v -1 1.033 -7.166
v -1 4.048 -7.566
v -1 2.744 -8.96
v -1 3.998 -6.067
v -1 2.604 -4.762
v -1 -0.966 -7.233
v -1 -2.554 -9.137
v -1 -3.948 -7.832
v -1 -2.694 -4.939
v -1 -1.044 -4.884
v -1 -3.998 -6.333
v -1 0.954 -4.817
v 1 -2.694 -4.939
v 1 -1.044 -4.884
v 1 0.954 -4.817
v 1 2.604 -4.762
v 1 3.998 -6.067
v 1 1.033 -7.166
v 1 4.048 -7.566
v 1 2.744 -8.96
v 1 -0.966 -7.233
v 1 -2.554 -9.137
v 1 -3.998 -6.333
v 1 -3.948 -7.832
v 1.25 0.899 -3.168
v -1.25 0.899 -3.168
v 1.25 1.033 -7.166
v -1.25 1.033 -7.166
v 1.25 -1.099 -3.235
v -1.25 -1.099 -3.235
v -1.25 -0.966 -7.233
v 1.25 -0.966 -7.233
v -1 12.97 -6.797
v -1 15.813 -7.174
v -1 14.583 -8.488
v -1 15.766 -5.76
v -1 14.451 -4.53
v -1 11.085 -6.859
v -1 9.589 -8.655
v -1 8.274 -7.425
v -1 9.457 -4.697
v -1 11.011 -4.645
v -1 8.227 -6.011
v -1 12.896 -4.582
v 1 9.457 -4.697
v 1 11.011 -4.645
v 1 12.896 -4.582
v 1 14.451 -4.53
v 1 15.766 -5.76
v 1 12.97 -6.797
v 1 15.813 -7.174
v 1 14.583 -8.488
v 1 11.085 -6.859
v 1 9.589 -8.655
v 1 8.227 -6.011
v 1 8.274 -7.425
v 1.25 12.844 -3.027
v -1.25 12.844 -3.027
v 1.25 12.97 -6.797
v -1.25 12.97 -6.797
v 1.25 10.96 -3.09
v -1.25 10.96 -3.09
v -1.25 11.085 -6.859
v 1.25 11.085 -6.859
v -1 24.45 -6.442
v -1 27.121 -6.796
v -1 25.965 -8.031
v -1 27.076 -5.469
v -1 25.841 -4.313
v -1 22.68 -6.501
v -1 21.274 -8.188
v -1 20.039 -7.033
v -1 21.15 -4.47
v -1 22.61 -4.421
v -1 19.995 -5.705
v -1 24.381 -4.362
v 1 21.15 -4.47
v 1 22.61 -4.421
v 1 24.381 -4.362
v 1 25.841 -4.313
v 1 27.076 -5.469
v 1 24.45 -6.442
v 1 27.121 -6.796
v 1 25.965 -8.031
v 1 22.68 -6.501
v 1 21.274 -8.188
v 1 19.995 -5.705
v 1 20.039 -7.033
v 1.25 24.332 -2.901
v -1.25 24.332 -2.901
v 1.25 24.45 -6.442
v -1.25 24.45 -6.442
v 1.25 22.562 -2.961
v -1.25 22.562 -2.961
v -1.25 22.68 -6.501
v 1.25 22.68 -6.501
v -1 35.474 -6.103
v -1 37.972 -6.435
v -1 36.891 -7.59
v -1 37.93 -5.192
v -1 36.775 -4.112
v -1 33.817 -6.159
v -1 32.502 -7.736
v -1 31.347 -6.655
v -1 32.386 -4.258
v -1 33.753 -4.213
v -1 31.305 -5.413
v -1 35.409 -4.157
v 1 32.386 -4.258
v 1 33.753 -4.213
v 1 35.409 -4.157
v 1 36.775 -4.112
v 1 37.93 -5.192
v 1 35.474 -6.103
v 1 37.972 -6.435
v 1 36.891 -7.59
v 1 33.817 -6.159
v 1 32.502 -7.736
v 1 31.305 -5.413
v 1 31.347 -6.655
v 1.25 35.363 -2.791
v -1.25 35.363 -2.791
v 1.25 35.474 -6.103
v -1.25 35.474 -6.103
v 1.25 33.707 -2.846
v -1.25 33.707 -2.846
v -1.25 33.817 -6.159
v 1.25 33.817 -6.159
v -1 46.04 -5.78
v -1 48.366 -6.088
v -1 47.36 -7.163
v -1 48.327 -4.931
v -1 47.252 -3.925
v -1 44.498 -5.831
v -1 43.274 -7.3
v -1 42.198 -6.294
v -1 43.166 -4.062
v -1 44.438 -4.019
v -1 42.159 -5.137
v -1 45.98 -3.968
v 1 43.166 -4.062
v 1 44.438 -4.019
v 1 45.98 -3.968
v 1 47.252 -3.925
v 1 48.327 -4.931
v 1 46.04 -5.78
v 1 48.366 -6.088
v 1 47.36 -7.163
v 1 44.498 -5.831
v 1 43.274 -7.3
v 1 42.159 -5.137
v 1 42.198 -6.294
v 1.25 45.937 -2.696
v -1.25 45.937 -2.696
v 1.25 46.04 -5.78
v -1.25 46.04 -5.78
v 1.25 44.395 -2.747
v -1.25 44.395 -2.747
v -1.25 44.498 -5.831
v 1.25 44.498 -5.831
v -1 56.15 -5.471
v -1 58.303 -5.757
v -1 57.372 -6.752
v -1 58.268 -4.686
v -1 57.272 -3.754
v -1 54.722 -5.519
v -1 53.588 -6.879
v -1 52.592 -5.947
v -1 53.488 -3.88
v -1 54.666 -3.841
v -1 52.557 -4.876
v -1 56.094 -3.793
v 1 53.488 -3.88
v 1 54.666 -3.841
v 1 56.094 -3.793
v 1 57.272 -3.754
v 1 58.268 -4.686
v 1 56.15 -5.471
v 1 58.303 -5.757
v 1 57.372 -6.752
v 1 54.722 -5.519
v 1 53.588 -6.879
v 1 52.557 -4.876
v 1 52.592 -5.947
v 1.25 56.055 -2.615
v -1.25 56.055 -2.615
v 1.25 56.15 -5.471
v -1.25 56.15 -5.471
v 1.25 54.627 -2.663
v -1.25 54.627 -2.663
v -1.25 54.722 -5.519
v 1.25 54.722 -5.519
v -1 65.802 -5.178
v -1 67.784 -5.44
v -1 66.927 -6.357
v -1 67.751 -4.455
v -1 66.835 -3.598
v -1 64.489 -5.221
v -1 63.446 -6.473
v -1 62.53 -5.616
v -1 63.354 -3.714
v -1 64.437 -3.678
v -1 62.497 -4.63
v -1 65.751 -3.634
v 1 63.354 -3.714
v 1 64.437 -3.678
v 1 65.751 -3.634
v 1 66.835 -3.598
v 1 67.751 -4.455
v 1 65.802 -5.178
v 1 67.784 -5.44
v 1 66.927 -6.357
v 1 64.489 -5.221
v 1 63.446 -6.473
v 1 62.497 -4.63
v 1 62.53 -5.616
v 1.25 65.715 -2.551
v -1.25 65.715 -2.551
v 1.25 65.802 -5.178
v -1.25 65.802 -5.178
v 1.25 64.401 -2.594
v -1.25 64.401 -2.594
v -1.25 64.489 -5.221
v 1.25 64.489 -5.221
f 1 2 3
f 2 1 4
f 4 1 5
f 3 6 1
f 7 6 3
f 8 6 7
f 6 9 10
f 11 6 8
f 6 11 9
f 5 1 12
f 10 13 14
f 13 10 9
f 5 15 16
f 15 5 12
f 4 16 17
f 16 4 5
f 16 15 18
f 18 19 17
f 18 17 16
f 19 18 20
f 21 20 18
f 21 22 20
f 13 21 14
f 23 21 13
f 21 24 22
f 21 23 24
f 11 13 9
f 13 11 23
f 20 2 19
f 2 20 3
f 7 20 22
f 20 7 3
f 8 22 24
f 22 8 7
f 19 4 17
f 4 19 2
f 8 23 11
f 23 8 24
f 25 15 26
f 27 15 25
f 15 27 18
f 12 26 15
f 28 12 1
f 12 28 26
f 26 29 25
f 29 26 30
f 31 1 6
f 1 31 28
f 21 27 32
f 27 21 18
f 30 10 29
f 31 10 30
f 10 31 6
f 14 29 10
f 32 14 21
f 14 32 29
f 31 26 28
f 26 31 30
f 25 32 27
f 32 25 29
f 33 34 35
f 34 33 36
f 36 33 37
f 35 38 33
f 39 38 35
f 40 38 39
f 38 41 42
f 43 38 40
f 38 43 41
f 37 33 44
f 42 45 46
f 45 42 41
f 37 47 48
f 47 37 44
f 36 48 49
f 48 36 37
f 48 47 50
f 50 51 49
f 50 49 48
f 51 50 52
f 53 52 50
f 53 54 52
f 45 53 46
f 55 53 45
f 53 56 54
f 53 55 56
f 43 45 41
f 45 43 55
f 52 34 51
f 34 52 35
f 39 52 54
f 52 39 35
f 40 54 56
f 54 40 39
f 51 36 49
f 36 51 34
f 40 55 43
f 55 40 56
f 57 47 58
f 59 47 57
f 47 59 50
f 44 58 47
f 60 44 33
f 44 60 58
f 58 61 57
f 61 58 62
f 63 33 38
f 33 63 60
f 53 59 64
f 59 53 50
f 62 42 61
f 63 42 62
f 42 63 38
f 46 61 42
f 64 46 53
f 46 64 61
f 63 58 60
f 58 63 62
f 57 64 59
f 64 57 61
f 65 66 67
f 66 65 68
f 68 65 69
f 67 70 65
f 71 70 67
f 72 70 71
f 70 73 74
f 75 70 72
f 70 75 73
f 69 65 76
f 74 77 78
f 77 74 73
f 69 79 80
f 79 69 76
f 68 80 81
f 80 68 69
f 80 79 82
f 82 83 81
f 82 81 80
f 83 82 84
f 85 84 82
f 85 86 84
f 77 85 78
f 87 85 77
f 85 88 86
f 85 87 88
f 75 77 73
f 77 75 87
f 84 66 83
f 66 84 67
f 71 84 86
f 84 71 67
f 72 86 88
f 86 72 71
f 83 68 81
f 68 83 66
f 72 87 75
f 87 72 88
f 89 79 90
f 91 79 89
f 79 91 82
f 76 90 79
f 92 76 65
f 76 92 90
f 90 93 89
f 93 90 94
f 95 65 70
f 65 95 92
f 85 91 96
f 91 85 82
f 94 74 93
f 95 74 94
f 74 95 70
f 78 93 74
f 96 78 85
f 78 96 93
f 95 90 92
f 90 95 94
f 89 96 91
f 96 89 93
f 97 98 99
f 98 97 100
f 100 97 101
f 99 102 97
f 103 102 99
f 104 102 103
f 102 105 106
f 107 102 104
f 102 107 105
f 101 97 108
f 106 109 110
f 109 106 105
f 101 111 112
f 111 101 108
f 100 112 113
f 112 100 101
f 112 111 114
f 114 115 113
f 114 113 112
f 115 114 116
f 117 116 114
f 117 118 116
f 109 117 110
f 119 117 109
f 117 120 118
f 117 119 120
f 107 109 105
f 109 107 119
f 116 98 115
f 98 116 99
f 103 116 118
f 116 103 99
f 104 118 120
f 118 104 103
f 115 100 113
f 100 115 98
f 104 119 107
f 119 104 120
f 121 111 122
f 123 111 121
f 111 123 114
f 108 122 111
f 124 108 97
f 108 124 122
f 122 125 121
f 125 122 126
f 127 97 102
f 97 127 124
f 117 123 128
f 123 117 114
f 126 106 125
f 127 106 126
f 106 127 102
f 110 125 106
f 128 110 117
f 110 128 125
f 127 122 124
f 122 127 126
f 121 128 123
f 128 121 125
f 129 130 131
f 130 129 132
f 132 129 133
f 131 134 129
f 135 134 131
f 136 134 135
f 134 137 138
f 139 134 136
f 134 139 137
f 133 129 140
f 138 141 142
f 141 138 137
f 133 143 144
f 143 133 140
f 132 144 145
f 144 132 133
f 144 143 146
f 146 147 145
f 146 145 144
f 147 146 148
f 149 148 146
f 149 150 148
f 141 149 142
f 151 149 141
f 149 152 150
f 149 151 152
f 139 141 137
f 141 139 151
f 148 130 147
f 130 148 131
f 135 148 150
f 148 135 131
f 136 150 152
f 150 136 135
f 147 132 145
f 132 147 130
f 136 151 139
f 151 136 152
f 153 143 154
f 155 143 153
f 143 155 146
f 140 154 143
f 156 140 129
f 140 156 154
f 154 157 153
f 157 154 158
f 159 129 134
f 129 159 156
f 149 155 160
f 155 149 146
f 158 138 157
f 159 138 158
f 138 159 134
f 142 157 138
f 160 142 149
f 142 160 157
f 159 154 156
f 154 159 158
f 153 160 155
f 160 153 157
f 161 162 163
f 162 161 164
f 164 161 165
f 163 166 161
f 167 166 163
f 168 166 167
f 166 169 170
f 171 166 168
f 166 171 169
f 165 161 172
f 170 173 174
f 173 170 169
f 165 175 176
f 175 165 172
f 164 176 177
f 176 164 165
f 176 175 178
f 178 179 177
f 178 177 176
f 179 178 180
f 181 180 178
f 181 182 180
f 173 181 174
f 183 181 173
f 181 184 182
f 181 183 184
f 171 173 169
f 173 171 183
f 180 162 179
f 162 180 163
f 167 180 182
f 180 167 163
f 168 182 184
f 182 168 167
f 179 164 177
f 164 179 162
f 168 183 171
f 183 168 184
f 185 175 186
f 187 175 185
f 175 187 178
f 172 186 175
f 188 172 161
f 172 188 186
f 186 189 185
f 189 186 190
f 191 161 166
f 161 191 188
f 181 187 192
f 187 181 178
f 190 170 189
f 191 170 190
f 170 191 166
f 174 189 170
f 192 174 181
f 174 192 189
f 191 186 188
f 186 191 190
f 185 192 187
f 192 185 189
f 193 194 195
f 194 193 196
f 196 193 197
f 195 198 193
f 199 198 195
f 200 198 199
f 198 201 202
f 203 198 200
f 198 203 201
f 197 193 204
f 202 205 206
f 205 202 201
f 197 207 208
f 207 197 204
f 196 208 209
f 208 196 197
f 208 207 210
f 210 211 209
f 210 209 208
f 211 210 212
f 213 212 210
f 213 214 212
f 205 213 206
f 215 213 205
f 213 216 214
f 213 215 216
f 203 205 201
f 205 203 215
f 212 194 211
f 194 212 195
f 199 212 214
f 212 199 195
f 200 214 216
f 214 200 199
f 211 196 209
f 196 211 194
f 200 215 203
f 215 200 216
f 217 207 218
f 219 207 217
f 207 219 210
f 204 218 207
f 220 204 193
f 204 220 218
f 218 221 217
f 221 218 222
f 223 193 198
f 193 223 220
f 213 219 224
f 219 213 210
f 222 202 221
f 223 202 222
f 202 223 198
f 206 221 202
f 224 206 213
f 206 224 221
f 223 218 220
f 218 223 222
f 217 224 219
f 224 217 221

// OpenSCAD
// file: trapazoid test.scad
module a(){
polyhedron(
points=[ 
//lower layer
[-10,10,0], //0 -X +Y
[10,10,0], //1 +X +Y
[10,-10,0], //2 +X -Y
[-10,-10,0], //3 -X -Y 


// uper layer
[-5,5,5], //4 -X +Y
[5,5,5], //5 +X +Y
[5,-5,5], //6 +X -Y
[-5,-5,5] //7 -X -Y 
],
 
faces=[ 
 [0,3,2,1],  // bottom  K
  [5,4,0,1],  // front K
  [4,5,6,7],  // top
  [1,2, 6,5],  // right K
  [7,6,2,3],  // back K
  [4,7,3,0]] // left K
  );
  }
  module a_vertex(){
  translate([-10,10,0])color("white")cube([.5,.5,.5],true); //0
  translate([10,10,0])color("blue")cube([.5,.5,.5],true); //1
  translate([10,-10,0])color("green")cube([.5,.5,.5],true); //2
  translate([-10,-10,0])color("black")cube([.5,.5,.5],true); //3
  translate([-5,5,5])color("red")cube([.5,.5,.5],true); //4
  translate([5,5,5])color("teal")cube([.5,.5,.5],true); //5
  translate([5,-5,5])color("maroon")cube([.5,.5,.5],true); //6
  translate([-5,-5,5])color("grey")cube([.5,.5,.5],true); 
  }
  module b(){
  polyhedron(
points=[ 
//lower layer
[-10,7,0], //0 -X +Y
[-7,10,0], //1
[7,10,0], // 2 +X +Y
[10,7,0], // 3 
[10,-7,0], //4 +X -Y
  [7,-10,0],//5
[-7,-10,0], //6 -X -Y
 [-10,-7,0], //7


// uper layer
[-7,7,5], //8 -X +Y  was 4
[7,7,5], //9 +X +Y   was 5
[7,-7,5], //10 +X -Y
[-7,-7,5] //11 -X -Y 
],
 
faces=[ 
 [0,7,6,5,4,3,2,1],  //K
 [0,1,8], //K
 [2,3,9], //K
 [4,5,10], //K
 [6,7,11], //K
  [1,2,9,8],  //K
  [8,9,10,11],  // K
  [10,9,3,4],  // K
  [11,10,5,6],  // K
  [0,8,11,7] //K
  ] // left
  );
  }
 // b();
 module c_vertex(){
  translate([-10,7,0])color("white")cube([.5,.5,.5],true); //0
  translate([-7,10,0])color("blue")cube([.5,.5,.5],true); //1
  translate([7,10,0])color("green")cube([.5,.5,.5],true); //2
  translate([10,7,0])color("black")cube([.5,.5,.5],true); //3
  translate([10,-7,0])color("red")cube([.5,.5,.5],true); //4
  translate([7,-10,0])color("teal")cube([.5,.5,.5],true); //5
  translate([-7,-10,0])color("maroon")cube([.5,.5,.5],true); //6
  translate([-10,-7,0])color("grey")cube([.5,.5,.5],true); //7
  
    translate([-7,7,5])color("pink")cube([.5,.5,.5],true);
  translate([7,7,5])color("purple")cube([.5,.5,.5],true);
  translate([7,-7,5])color("cyan")cube([.5,.5,.5],true); //10
  translate([-7,-7,5])color("orange")cube([.5,.5,.5],true); //11
 }
  
  module trapazoidal_prism(X1, Y1, X2, Y2, Z){
      polyhedron(
points=[ 
//lower layer
[-.5*X1,.5*Y1,0], //0 -X +Y
[.5*X1,.5*Y1,0], //1 +X +Y
[.5*X1,-.5*Y1,0], //2 +X -Y
[-.5*X1,-.5*Y1,0], //3 -X -Y 


// uper layer
[-.5*X2,.5*Y2,Z], //4 -X +Y
[.5*X2,.5*Y2,Z], //5 +X +Y
[.5*X2,-.5*Y2,Z], //6 +X -Y
[-.5*X2,-.5*Y2,Z] //7 -X -Y 
],
 
faces=[ 
 [0,3,2,1],  // bottom  K
  [5,4,0,1],  // front K
  [4,5,6,7],  // top
  [1,2, 6,5],  // right K
  [7,6,2,3],  // back K
  [4,7,3,0]] // left
  );
  
  }
  
   module trapazoidal_prism_B(X1, Y1, X2, Y2, Z){
      //lower layer
        polyhedron(
points=[ 
[-.5*X1,.5*Y1-((Y1-Y2)/2),0], //0 -X +Y
[-1*(.5*X1-((X1-X2)/2)),.5*Y1,0], //1
[.5*X1-((X1-X2)/2),.5*Y1,0], // 2 +X +Y
[.5*X1,.5*Y1-((Y1-Y2)/2),0], // 3 
[.5*X1,-1*(.5*Y1-((Y1-Y2)/2)),0], //4 +X -Y
  [.5*X1-((X1-X2)/2),-.5*Y1,0],//5
[-1*(.5*X1-((X1-X2)/2)),-.5*Y1,0], //6 -X -Y
 [-.5*X1,-1*(.5*Y1-((Y1-Y2)/2)),0], //7


// uper layer
       

[-.5*X2,.5*Y2,Z], //8 -X +Y  was 4
[.5*X2,.5*Y2,Z], //9 +X +Y   was 5
[.5*X2,-.5*Y2,Z], //10 +X -Y
[-.5*X2,-.5*Y2,Z] //11 -X -Y 
],
 
faces=[ 
 [0,7,6,5,4,3,2,1],  //K
 [0,1,8], //K
 [2,3,9], //K
 [4,5,10], //K
 [6,7,11], //K
  [1,2,9,8],  //K
  [8,9,10,11],  // K
  [10,9,3,4],  // K
  [11,10,5,6],  // K
  [0,8,11,7] //K
  ]  // left
  );
  }
  
     module octogon_extrude(X1, Y1, X2, Y2, Z){
      //lower layer
linear_extrude(Z)
        polygon(
points=[ 
[-.5*X1,.5*Y1-((Y1-Y2)/2)], //0 -X +Y
[-1*(.5*X1-((X1-X2)/2)),.5*Y1], //1
[.5*X1-((X1-X2)/2),.5*Y1], // 2 +X +Y
[.5*X1,.5*Y1-((Y1-Y2)/2)], // 3 
[.5*X1,-1*(.5*Y1-((Y1-Y2)/2))], //4 +X -Y
  [.5*X1-((X1-X2)/2),-.5*Y1],//5
[-1*(.5*X1-((X1-X2)/2)),-.5*Y1], //6 -X -Y
 [-.5*X1,-1*(.5*Y1-((Y1-Y2)/2))], //7
]
 
      );
  }
  module offset_trapazoidal_prism(X1, Y1, X2, Y2, X3, Y3, Z){
      polyhedron(
points=[ 
//lower layer
[-.5*X1,.5*Y1,0], //0 -X +Y
[.5*X1,.5*Y1,0], //1 +X +Y
[.5*X1,-.5*Y1,0], //2 +X -Y
[-.5*X1,-.5*Y1,0], //3 -X -Y 

// uper layer
[-.5*X2+X3,.5*Y2+Y3,Z], //4 -X +Y
[.5*X2+X3,.5*Y2+Y3,Z], //5 +X +Y
[.5*X2+X3,-.5*Y2+Y3,Z], //6 +X -Y
[-.5*X2+X3,-.5*Y2+Y3,Z] //7 -X -Y 
],
 
faces=[ 
 [0,3,2,1],  // bottom  K
  [5,4,0,1],  // front K
  [4,5,6,7],  // top
  [1,2, 6,5],  // right K
  [7,6,2,3],  // back K
  [4,7,3,0]] // left
  );
  
  }
  
module simplified_offset_trapazoidal_prism(D1, D2, X1, Y1, Z){
      polyhedron(
points=[ 
//lower layer
[-.5*D1,.5*D1,0], //0 -X +Y
[.5*D1,.5*D1,0], //1 +X +Y
[.5*D1,-.5*D1,0], //2 +X -Y
[-.5*D1,-.5*D1,0], //3 -X -Y 

// uper layer
[-.5*D2+X1,.5*D2+Y1,Z], //4 -X +Y
[.5*D2+X1,.5*D2+Y1,Z], //5 +X +Y
[.5*D2+X1,-.5*D2+Y1,Z], //6 +X -Y
[-.5*D2+X1,-.5*D2+Y1,Z] //7 -X -Y 
],
 
faces=[ 
 [0,3,2,1],  // bottom  K
  [5,4,0,1],  // front K
  [4,5,6,7],  // top
  [1,2, 6,5],  // right K
  [7,6,2,3],  // back K
  [4,7,3,0]] // left
  );
  
  }

  module trig_test(Ang, Op, Base){
      polygon([ [-1*(.5*Base-(Op/tan(Ang))),Op],
      [.5*Base-Op/tan(Ang),Op], 
      [.5*Base,0],
      [-.5*Base,0]]);
  }
    module trig_test_2(Ang, Ang2, Op, Base){
      polygon([ [-1*(.5*Base-(Op/tan(Ang))),Op],
      [.5*Base-Op/tan(Ang2),Op], 
      [.5*Base,0],
      [-.5*Base,0]]);
  }

  
  
  module angle_prism(D, Z, Ang1, Ang2){
            polyhedron(
points=[ 
//lower layer
[-.5*D,.5*D,0], //0 -X +Y
[.5*D,.5*D,0], //1 +X +Y
[.5*D,-.5*D,0], //2 +X -Y
[-.5*D,-.5*D,0], //3 -X -Y 

// uper layer
[-1*(.5*D-(Z/tan(Ang1))),.5*D,Z], //4 -X +Y
[.5*D-(Z/tan(Ang2)),.5*D,Z], //5 +X +Y
[.5*D-(Z/tan(Ang2)),-.5*D,Z], //6 +X -Y
[-1*(.5*D-(Z/tan(Ang1))),-.5*D,Z] //7 -X -Y 
],
 
faces=[ 
 [0,1,2,3],  // bottom  K
  [0,4,5,1],  // front K
  [4,7,6,5],  // top
  [1,5, 6,2],  // right K
  [7,3,2,6],  // back K
  [4,0,3,7]] 
  );
  
  }
  
  module angle_prism_W(X, Y, Z, Ang1, Ang2){
            polyhedron(
points=[ 
//lower layer
[-.5*X,.5*Y,0], //0 -X +Y
[.5*X,.5*Y,0], //1 +X +Y
[.5*X,-.5*Y,0], //2 +X -Y
[-.5*X,-.5*Y,0], //3 -X -Y 

// uper layer
[-1*(.5*X  -(Z/tan(Ang1))),.5*Y,Z], //4 -X +Y
[.5*X-(Z/tan(Ang2)),.5*Y,Z], //5 +X +Y
[.5*X-(Z/tan(Ang2)),-.5*Y,Z], //6 +X -Y
[-1*(.5*X-(Z/tan(Ang1))),-.5*Y,Z] //7 -X -Y 
],
 
faces=[ 
 [0,1,2,3],  // bottom  K
  [0,4,5,1],  // front K
  [4,7,6,5],  // top
  [1,5, 6,2],  // right K
  [7,3,2,6],  // back K
  [4,0,3,7]] 
  );
  
  }
  
  
  module 4_angle_prism_W(X, Y, Z, Ang1, Ang2, Ang3, Ang4){
      //(Width, depth, heith, angle -x side, angle +x side, angle +y side, angle - y side
            polyhedron(
points=[ 
//lower layer
[-.5*X,.5*Y,0], //0 -X +Y
[.5*X,.5*Y,0], //1 +X +Y
[.5*X,-.5*Y,0], //2 +X -Y
[-.5*X,-.5*Y,0], //3 -X -Y 

// uper layer
[-1*(.5*X  -(Z/tan(Ang1))),.5*Y-(Z/tan(Ang3)),Z], //4 -X +Y
[.5*X-(Z/tan(Ang2)),.5*Y-(Z/tan(Ang3)),Z], //5 +X +Y
[.5*X-(Z/tan(Ang2)),-1*(.5*Y  -(Z/tan(Ang4))),Z], //6 +X -Y
[-1*(.5*X-(Z/tan(Ang1))),-1*(.5*Y  -(Z/tan(Ang4))),Z] //7 -X -Y 
],
 
faces=[ 
// [0,3,2,1],  // bottom  K
  [5,4,0,1],  // front K
  [4,5,6,7],  // top
 // [1,2, 6,5],  // right K
  [7,6,2,3],  // back K
  [4,7,3,0]] // left
  );
  
  }
  
  //4_angle_prism_W(25, 10, 5, 80, 45, 60, 90);
  difference(){
  //translate([0,-52,-9.398])rotate([0,0,-90])angle_prism(10, 9.398, 90, 90);
    //translate([0,11,-7.3 ])rotate([0,-1.91,90])   trapazoidal_prism_B(95,3,91,3,1);
//translate([0,11,-7.3 ])rotate([0,-1.91,90])   cube([95,4,4]);
  }
// main file
//angle 1.91 degrees
include <trapazoid test.scad>
//cube([4,105,1],true);
//translate([0,-1,-2.5])cube([1,121,6],true);
//translate([0,-52,-4.5])cube([4,1,10],true);
//translate([0,-56.5,-6])cube([4,10,7],true);
difference(){
translate([0,-52,-9.398])rotate([0,0,90])
    angle_prism(1, 9.398, 1.91, 90);
 //  color("Green")translate([0,89.5,0])rotate([180,0,-90]) angle_prism_W( 281.814,  .5, 9.398, 1.91, 90);
    translate([0,11,-7.3 ])rotate([0,-1.91,90])   trapazoidal_prism_B(95,3,91,3,1);
    }
//translate([0,-52,-8.398])color("green")rotate([0,0,-90])angle_prism(1, 9.398, 90, 1.91);
module seration(){
angle_prism_W(8,2,1.35,45,45);
translate([0,0,-1.5])angle_prism_W(8,2,-1.35,-45,-45);
translate([0,0,-.75])cube([8,2,1.5],true);
translate([0,0,1])cube([2,2.5,4],true);
}


function compute(last_value, iteration=0) =  
    iteration == 0 ? 
        last_value : 
        compute(last_value + 4 + 8*(1.0571428-iteration*.0571428), iteration-1);

function compute2(last_value, iteration=0) =  
    iteration == 0 ? 
        last_value : 
        compute2(last_value +6-(6*(1.0571428-iteration*.0571428)/2), iteration-1);

module sarate(){
    for (i = [1:1:7]){
        offset = compute(0, i-1);
        offset_down = ((6-6*(1.0571428-i*.0571428))/2)/2;
        translate([offset,0,-offset_down])scale([1.0571428-i*.0571428,1,1.0571428-i*.0571428])seration();
   }
   }
translate([0,0,-6.2 ])color("red")rotate([0,-1.91,90]) sarate();
//translate([0,-44,-5])cube([4,15,10],true);   
//translate([0,11,-7.3 ])rotate([0,-1.91,90])   trapazoidal_prism_B(95,3,91,3,1);
